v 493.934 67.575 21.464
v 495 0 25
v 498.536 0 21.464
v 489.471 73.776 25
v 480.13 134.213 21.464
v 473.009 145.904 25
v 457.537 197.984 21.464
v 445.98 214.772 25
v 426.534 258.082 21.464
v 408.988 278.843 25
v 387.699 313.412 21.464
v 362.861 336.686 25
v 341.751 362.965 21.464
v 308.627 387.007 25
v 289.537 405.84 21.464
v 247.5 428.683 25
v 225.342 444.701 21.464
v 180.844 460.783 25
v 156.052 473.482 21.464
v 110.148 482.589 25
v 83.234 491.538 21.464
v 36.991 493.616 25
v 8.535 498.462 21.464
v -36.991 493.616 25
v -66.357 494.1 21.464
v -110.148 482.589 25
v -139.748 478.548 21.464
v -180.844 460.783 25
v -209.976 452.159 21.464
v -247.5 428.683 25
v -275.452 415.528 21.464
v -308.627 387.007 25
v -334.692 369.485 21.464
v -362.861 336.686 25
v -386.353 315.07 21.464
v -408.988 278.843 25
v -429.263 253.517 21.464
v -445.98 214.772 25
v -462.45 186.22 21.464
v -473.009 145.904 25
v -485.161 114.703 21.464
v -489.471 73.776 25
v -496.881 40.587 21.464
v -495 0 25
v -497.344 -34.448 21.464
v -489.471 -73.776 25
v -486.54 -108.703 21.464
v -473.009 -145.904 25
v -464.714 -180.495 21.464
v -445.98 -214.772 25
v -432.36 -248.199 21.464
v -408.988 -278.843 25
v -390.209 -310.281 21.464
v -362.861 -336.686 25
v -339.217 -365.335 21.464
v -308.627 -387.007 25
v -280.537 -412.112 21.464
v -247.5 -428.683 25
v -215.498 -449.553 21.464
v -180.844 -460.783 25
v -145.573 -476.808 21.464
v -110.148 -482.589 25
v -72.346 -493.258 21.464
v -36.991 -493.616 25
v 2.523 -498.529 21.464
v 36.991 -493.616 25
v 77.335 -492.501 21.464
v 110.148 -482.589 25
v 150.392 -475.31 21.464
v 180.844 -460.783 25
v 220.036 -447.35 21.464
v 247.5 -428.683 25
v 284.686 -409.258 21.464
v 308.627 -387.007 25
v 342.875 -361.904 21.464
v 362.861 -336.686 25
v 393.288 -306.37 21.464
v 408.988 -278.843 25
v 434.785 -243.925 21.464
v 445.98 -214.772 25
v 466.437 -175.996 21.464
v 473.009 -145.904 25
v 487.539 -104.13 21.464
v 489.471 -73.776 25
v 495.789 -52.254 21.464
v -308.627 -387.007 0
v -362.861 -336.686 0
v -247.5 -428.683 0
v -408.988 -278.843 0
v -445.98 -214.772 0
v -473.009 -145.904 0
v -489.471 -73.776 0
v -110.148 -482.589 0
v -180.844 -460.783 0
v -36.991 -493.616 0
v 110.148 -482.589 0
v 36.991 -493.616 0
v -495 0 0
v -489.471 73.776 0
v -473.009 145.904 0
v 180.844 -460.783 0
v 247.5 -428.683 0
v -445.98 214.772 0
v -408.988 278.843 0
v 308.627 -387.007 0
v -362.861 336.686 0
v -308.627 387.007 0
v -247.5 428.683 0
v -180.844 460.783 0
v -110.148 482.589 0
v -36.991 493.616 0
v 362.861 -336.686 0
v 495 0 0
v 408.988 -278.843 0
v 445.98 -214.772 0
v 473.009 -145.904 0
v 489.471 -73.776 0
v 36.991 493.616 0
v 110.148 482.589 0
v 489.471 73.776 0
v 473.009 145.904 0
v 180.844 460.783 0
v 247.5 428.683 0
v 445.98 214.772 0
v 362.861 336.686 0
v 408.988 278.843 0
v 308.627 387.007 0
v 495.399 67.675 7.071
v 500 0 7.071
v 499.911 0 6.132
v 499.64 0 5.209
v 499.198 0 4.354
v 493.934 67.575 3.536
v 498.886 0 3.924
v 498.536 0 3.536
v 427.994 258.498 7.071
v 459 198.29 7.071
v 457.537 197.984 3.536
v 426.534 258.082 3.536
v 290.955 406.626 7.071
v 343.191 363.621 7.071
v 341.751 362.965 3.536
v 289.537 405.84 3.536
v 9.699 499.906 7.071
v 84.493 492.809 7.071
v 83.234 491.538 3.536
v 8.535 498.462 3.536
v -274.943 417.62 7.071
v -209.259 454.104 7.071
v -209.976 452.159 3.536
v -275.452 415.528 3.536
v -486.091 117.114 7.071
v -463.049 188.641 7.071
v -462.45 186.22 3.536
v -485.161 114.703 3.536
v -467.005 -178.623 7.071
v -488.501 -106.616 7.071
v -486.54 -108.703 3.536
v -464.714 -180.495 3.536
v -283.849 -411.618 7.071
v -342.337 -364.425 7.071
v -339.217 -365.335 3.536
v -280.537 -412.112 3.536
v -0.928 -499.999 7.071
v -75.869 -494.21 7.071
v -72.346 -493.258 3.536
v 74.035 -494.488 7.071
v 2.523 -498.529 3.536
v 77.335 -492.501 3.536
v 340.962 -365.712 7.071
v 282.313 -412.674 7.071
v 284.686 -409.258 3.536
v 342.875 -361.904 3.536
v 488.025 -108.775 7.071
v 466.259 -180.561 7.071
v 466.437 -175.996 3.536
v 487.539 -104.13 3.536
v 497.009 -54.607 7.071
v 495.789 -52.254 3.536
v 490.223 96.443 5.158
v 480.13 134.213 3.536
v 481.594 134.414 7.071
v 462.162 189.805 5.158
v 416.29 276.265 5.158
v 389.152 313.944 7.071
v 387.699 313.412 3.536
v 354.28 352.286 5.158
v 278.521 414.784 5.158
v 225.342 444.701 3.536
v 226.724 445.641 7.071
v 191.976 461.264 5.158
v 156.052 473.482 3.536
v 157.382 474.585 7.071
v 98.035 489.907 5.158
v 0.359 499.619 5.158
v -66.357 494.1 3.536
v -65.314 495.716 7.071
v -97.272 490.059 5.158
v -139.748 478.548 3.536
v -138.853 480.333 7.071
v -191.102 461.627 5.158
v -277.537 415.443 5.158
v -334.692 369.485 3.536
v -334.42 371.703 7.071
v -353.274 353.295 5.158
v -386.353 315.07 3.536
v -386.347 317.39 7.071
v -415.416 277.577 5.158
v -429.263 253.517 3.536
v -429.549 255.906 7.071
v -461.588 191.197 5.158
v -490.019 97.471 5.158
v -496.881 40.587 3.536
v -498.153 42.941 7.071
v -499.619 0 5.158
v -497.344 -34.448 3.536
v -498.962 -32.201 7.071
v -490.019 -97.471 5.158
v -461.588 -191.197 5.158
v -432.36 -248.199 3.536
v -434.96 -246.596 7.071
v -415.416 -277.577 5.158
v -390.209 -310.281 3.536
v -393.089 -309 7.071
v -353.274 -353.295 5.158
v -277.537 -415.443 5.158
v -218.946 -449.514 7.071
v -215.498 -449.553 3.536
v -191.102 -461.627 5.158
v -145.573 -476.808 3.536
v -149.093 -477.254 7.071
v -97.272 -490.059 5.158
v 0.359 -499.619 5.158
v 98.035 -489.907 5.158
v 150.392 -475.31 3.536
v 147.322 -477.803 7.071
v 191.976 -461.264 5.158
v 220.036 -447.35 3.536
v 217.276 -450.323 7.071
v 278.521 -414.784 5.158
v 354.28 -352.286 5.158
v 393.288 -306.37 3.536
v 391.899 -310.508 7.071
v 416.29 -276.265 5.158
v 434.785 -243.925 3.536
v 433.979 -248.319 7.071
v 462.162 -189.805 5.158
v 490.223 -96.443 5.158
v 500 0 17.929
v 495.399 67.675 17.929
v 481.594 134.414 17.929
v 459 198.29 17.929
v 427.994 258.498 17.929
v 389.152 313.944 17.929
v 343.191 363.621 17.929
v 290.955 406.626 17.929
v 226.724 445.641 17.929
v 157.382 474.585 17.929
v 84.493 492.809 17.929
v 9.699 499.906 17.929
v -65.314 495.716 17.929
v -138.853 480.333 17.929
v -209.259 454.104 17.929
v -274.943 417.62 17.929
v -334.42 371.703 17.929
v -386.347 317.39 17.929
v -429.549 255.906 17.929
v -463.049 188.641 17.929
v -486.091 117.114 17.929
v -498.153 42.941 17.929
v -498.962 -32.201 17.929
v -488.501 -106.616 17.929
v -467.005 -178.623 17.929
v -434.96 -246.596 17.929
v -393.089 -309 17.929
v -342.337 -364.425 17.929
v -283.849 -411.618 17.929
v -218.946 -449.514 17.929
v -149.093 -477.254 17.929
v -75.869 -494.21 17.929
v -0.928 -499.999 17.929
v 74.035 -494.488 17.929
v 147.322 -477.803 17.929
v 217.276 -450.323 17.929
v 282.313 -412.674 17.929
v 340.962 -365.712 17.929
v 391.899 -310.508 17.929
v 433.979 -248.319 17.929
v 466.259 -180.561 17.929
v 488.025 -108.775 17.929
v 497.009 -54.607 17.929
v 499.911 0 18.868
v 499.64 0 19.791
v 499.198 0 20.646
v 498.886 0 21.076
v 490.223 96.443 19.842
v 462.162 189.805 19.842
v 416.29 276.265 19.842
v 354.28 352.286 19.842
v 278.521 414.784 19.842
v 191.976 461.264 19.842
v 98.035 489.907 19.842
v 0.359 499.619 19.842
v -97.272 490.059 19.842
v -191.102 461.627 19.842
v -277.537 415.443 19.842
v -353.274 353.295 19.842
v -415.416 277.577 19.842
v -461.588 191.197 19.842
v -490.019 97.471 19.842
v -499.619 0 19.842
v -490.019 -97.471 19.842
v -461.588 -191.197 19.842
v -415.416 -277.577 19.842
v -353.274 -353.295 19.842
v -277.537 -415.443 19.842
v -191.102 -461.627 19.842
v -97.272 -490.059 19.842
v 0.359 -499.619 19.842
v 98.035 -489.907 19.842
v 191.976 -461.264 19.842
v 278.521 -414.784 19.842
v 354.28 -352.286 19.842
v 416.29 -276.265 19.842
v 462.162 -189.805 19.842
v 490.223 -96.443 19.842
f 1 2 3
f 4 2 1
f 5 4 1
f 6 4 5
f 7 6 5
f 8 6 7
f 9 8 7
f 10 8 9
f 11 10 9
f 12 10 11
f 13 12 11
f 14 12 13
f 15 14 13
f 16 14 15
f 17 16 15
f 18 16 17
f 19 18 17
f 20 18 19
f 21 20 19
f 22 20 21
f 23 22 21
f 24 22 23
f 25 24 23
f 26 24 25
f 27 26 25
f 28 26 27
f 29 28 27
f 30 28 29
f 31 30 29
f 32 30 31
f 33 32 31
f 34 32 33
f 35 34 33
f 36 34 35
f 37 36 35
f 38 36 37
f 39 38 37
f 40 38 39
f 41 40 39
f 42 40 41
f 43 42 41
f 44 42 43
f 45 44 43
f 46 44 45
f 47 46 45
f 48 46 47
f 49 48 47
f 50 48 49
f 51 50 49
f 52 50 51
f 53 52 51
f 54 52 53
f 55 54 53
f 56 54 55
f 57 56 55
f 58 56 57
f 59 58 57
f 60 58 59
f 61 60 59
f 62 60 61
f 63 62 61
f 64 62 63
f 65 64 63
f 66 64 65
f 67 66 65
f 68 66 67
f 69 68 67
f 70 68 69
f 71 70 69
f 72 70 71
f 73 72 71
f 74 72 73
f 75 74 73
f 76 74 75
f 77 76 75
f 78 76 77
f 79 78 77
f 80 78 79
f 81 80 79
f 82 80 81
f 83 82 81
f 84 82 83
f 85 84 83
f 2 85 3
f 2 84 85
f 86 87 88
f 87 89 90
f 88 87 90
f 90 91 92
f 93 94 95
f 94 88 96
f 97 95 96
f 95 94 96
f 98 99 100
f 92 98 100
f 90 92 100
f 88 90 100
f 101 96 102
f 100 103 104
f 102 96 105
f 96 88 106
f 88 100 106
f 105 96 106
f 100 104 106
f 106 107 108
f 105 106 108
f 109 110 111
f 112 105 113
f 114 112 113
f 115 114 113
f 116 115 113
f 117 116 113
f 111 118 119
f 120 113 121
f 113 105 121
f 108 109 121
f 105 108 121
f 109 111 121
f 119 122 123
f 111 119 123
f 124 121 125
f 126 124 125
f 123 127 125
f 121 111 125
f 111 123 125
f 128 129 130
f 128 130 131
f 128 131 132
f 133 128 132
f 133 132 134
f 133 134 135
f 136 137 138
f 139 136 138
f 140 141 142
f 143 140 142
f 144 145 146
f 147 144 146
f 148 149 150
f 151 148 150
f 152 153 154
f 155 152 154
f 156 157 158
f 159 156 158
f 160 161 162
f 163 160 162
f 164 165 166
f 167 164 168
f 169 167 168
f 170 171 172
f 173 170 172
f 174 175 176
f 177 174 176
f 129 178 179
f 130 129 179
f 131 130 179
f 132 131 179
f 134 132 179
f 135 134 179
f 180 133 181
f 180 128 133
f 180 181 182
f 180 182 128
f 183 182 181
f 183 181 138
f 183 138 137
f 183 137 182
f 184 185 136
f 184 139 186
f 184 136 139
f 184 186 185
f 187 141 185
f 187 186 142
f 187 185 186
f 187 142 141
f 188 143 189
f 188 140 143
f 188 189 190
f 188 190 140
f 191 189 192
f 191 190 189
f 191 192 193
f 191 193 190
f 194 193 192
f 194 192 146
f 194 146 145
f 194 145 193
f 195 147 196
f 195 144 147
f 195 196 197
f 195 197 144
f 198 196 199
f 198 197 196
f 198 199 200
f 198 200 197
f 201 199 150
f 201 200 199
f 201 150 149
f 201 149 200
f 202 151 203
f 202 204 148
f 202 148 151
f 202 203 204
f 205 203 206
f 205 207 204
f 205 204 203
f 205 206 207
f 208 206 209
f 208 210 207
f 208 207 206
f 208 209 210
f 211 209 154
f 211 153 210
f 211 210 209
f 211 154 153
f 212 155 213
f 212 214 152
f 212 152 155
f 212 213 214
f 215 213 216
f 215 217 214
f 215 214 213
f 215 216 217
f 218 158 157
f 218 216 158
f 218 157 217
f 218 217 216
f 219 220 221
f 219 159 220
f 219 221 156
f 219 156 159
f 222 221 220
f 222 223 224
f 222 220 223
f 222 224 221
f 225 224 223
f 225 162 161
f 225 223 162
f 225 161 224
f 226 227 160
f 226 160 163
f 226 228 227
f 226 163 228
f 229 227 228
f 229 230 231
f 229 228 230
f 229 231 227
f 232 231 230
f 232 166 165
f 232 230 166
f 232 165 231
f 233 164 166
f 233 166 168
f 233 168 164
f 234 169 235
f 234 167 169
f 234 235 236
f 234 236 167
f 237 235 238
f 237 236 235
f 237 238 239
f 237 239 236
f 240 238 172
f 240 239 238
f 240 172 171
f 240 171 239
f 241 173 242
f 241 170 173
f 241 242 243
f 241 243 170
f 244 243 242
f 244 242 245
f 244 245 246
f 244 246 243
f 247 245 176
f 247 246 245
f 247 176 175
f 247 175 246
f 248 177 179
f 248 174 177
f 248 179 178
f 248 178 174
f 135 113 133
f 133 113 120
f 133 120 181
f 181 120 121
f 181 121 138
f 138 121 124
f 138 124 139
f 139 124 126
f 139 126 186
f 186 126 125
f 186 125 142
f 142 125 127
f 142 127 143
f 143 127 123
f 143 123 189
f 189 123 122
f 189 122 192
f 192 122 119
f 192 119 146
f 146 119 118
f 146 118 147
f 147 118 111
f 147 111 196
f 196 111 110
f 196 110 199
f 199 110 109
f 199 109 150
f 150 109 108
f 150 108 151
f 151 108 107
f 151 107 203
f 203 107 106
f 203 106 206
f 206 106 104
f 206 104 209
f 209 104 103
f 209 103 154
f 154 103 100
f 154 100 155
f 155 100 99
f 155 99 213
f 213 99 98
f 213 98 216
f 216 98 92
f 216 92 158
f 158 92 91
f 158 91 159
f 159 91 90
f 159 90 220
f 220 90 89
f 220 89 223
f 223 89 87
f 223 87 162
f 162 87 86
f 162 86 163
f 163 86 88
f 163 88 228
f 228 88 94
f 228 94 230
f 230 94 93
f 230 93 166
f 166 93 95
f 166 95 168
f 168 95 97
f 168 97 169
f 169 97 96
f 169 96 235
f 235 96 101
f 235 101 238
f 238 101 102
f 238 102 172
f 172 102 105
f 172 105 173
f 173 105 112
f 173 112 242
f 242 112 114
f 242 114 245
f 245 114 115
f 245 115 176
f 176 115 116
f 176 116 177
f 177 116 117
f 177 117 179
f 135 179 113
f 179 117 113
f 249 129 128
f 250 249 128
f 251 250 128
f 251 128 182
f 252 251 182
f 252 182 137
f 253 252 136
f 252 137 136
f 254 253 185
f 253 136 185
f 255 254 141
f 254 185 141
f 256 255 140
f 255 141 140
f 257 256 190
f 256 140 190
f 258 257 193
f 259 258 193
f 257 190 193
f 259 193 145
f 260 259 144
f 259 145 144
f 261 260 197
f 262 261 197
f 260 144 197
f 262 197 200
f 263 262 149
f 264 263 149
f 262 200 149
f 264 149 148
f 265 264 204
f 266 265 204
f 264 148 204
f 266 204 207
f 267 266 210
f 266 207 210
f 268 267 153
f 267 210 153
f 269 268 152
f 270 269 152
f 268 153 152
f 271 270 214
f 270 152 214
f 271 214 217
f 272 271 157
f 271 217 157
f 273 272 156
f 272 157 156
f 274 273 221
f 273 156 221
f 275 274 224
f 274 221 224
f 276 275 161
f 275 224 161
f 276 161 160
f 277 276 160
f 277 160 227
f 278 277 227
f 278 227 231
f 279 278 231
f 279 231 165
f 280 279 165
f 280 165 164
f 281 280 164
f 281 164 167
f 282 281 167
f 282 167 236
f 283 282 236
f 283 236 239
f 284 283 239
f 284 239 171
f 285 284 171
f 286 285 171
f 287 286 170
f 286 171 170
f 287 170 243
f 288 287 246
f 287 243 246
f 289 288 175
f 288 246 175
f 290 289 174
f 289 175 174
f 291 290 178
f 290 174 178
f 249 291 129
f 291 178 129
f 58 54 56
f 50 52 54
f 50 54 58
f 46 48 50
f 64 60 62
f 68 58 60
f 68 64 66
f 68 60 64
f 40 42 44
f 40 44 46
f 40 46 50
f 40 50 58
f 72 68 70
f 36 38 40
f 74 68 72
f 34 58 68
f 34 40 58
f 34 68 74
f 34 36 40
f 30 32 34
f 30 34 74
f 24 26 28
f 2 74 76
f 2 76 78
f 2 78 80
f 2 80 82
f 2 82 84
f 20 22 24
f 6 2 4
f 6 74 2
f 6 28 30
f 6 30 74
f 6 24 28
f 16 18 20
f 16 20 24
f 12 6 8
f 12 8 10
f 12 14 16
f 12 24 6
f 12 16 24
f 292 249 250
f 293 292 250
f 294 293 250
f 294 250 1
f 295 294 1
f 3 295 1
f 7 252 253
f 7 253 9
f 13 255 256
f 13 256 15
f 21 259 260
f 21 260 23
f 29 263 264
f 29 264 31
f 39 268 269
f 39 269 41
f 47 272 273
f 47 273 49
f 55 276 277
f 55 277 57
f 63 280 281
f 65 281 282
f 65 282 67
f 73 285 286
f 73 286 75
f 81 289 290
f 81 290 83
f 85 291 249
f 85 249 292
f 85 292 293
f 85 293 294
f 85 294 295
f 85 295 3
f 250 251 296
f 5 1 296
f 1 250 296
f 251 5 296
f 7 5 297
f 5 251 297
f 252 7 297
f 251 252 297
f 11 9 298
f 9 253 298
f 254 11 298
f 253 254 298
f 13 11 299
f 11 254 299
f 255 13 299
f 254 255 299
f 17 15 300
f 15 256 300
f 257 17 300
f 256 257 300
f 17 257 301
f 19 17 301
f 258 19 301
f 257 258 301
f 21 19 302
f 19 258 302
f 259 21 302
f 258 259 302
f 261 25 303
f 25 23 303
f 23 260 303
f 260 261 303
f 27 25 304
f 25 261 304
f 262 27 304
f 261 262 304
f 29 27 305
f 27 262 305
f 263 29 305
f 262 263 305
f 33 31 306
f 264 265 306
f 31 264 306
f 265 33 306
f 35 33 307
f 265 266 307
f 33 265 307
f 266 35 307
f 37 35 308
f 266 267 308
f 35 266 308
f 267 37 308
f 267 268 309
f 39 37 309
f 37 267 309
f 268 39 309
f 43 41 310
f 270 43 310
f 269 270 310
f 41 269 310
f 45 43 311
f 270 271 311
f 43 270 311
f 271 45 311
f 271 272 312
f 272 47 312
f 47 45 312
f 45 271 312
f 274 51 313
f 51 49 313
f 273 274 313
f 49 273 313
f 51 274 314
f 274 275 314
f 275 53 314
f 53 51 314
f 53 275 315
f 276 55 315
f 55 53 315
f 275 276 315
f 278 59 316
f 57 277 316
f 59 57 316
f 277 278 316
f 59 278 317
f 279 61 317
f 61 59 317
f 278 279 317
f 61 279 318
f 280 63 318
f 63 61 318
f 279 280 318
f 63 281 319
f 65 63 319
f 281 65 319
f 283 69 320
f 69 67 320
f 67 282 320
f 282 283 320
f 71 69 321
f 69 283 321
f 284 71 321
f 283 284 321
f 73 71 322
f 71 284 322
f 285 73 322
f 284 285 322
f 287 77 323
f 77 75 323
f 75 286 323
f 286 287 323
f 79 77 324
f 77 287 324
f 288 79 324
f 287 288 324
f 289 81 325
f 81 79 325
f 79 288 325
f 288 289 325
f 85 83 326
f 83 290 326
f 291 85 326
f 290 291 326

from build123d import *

# Parameters (mm, degrees)
F0_R     = 500
F1_DEPTH = 25
F2_SIZE  = 5
F3_R     = 5


with BuildPart() as f1:
    # F0 (on Top) → F1 (new body)
    with BuildSketch(Plane.XY):
        Circle(F0_R)
    extrude(amount=F1_DEPTH)

    # F2
    f2_edges = [f1.edges().sort_by_distance(p)[0] for p in [
        (-500, 0, 25),
        (-500, 0, 0),
    ]]
    chamfer(f2_edges, length=F2_SIZE)

    # F3
    f3_edges = [f1.edges().sort_by_distance(p)[0] for p in [
        (500, 0, 12.5),
        (-500, 0, 5),
        (-500, 0, 20),
    ]]
    fillet(f3_edges, radius=F3_R)


solid = f1.part
